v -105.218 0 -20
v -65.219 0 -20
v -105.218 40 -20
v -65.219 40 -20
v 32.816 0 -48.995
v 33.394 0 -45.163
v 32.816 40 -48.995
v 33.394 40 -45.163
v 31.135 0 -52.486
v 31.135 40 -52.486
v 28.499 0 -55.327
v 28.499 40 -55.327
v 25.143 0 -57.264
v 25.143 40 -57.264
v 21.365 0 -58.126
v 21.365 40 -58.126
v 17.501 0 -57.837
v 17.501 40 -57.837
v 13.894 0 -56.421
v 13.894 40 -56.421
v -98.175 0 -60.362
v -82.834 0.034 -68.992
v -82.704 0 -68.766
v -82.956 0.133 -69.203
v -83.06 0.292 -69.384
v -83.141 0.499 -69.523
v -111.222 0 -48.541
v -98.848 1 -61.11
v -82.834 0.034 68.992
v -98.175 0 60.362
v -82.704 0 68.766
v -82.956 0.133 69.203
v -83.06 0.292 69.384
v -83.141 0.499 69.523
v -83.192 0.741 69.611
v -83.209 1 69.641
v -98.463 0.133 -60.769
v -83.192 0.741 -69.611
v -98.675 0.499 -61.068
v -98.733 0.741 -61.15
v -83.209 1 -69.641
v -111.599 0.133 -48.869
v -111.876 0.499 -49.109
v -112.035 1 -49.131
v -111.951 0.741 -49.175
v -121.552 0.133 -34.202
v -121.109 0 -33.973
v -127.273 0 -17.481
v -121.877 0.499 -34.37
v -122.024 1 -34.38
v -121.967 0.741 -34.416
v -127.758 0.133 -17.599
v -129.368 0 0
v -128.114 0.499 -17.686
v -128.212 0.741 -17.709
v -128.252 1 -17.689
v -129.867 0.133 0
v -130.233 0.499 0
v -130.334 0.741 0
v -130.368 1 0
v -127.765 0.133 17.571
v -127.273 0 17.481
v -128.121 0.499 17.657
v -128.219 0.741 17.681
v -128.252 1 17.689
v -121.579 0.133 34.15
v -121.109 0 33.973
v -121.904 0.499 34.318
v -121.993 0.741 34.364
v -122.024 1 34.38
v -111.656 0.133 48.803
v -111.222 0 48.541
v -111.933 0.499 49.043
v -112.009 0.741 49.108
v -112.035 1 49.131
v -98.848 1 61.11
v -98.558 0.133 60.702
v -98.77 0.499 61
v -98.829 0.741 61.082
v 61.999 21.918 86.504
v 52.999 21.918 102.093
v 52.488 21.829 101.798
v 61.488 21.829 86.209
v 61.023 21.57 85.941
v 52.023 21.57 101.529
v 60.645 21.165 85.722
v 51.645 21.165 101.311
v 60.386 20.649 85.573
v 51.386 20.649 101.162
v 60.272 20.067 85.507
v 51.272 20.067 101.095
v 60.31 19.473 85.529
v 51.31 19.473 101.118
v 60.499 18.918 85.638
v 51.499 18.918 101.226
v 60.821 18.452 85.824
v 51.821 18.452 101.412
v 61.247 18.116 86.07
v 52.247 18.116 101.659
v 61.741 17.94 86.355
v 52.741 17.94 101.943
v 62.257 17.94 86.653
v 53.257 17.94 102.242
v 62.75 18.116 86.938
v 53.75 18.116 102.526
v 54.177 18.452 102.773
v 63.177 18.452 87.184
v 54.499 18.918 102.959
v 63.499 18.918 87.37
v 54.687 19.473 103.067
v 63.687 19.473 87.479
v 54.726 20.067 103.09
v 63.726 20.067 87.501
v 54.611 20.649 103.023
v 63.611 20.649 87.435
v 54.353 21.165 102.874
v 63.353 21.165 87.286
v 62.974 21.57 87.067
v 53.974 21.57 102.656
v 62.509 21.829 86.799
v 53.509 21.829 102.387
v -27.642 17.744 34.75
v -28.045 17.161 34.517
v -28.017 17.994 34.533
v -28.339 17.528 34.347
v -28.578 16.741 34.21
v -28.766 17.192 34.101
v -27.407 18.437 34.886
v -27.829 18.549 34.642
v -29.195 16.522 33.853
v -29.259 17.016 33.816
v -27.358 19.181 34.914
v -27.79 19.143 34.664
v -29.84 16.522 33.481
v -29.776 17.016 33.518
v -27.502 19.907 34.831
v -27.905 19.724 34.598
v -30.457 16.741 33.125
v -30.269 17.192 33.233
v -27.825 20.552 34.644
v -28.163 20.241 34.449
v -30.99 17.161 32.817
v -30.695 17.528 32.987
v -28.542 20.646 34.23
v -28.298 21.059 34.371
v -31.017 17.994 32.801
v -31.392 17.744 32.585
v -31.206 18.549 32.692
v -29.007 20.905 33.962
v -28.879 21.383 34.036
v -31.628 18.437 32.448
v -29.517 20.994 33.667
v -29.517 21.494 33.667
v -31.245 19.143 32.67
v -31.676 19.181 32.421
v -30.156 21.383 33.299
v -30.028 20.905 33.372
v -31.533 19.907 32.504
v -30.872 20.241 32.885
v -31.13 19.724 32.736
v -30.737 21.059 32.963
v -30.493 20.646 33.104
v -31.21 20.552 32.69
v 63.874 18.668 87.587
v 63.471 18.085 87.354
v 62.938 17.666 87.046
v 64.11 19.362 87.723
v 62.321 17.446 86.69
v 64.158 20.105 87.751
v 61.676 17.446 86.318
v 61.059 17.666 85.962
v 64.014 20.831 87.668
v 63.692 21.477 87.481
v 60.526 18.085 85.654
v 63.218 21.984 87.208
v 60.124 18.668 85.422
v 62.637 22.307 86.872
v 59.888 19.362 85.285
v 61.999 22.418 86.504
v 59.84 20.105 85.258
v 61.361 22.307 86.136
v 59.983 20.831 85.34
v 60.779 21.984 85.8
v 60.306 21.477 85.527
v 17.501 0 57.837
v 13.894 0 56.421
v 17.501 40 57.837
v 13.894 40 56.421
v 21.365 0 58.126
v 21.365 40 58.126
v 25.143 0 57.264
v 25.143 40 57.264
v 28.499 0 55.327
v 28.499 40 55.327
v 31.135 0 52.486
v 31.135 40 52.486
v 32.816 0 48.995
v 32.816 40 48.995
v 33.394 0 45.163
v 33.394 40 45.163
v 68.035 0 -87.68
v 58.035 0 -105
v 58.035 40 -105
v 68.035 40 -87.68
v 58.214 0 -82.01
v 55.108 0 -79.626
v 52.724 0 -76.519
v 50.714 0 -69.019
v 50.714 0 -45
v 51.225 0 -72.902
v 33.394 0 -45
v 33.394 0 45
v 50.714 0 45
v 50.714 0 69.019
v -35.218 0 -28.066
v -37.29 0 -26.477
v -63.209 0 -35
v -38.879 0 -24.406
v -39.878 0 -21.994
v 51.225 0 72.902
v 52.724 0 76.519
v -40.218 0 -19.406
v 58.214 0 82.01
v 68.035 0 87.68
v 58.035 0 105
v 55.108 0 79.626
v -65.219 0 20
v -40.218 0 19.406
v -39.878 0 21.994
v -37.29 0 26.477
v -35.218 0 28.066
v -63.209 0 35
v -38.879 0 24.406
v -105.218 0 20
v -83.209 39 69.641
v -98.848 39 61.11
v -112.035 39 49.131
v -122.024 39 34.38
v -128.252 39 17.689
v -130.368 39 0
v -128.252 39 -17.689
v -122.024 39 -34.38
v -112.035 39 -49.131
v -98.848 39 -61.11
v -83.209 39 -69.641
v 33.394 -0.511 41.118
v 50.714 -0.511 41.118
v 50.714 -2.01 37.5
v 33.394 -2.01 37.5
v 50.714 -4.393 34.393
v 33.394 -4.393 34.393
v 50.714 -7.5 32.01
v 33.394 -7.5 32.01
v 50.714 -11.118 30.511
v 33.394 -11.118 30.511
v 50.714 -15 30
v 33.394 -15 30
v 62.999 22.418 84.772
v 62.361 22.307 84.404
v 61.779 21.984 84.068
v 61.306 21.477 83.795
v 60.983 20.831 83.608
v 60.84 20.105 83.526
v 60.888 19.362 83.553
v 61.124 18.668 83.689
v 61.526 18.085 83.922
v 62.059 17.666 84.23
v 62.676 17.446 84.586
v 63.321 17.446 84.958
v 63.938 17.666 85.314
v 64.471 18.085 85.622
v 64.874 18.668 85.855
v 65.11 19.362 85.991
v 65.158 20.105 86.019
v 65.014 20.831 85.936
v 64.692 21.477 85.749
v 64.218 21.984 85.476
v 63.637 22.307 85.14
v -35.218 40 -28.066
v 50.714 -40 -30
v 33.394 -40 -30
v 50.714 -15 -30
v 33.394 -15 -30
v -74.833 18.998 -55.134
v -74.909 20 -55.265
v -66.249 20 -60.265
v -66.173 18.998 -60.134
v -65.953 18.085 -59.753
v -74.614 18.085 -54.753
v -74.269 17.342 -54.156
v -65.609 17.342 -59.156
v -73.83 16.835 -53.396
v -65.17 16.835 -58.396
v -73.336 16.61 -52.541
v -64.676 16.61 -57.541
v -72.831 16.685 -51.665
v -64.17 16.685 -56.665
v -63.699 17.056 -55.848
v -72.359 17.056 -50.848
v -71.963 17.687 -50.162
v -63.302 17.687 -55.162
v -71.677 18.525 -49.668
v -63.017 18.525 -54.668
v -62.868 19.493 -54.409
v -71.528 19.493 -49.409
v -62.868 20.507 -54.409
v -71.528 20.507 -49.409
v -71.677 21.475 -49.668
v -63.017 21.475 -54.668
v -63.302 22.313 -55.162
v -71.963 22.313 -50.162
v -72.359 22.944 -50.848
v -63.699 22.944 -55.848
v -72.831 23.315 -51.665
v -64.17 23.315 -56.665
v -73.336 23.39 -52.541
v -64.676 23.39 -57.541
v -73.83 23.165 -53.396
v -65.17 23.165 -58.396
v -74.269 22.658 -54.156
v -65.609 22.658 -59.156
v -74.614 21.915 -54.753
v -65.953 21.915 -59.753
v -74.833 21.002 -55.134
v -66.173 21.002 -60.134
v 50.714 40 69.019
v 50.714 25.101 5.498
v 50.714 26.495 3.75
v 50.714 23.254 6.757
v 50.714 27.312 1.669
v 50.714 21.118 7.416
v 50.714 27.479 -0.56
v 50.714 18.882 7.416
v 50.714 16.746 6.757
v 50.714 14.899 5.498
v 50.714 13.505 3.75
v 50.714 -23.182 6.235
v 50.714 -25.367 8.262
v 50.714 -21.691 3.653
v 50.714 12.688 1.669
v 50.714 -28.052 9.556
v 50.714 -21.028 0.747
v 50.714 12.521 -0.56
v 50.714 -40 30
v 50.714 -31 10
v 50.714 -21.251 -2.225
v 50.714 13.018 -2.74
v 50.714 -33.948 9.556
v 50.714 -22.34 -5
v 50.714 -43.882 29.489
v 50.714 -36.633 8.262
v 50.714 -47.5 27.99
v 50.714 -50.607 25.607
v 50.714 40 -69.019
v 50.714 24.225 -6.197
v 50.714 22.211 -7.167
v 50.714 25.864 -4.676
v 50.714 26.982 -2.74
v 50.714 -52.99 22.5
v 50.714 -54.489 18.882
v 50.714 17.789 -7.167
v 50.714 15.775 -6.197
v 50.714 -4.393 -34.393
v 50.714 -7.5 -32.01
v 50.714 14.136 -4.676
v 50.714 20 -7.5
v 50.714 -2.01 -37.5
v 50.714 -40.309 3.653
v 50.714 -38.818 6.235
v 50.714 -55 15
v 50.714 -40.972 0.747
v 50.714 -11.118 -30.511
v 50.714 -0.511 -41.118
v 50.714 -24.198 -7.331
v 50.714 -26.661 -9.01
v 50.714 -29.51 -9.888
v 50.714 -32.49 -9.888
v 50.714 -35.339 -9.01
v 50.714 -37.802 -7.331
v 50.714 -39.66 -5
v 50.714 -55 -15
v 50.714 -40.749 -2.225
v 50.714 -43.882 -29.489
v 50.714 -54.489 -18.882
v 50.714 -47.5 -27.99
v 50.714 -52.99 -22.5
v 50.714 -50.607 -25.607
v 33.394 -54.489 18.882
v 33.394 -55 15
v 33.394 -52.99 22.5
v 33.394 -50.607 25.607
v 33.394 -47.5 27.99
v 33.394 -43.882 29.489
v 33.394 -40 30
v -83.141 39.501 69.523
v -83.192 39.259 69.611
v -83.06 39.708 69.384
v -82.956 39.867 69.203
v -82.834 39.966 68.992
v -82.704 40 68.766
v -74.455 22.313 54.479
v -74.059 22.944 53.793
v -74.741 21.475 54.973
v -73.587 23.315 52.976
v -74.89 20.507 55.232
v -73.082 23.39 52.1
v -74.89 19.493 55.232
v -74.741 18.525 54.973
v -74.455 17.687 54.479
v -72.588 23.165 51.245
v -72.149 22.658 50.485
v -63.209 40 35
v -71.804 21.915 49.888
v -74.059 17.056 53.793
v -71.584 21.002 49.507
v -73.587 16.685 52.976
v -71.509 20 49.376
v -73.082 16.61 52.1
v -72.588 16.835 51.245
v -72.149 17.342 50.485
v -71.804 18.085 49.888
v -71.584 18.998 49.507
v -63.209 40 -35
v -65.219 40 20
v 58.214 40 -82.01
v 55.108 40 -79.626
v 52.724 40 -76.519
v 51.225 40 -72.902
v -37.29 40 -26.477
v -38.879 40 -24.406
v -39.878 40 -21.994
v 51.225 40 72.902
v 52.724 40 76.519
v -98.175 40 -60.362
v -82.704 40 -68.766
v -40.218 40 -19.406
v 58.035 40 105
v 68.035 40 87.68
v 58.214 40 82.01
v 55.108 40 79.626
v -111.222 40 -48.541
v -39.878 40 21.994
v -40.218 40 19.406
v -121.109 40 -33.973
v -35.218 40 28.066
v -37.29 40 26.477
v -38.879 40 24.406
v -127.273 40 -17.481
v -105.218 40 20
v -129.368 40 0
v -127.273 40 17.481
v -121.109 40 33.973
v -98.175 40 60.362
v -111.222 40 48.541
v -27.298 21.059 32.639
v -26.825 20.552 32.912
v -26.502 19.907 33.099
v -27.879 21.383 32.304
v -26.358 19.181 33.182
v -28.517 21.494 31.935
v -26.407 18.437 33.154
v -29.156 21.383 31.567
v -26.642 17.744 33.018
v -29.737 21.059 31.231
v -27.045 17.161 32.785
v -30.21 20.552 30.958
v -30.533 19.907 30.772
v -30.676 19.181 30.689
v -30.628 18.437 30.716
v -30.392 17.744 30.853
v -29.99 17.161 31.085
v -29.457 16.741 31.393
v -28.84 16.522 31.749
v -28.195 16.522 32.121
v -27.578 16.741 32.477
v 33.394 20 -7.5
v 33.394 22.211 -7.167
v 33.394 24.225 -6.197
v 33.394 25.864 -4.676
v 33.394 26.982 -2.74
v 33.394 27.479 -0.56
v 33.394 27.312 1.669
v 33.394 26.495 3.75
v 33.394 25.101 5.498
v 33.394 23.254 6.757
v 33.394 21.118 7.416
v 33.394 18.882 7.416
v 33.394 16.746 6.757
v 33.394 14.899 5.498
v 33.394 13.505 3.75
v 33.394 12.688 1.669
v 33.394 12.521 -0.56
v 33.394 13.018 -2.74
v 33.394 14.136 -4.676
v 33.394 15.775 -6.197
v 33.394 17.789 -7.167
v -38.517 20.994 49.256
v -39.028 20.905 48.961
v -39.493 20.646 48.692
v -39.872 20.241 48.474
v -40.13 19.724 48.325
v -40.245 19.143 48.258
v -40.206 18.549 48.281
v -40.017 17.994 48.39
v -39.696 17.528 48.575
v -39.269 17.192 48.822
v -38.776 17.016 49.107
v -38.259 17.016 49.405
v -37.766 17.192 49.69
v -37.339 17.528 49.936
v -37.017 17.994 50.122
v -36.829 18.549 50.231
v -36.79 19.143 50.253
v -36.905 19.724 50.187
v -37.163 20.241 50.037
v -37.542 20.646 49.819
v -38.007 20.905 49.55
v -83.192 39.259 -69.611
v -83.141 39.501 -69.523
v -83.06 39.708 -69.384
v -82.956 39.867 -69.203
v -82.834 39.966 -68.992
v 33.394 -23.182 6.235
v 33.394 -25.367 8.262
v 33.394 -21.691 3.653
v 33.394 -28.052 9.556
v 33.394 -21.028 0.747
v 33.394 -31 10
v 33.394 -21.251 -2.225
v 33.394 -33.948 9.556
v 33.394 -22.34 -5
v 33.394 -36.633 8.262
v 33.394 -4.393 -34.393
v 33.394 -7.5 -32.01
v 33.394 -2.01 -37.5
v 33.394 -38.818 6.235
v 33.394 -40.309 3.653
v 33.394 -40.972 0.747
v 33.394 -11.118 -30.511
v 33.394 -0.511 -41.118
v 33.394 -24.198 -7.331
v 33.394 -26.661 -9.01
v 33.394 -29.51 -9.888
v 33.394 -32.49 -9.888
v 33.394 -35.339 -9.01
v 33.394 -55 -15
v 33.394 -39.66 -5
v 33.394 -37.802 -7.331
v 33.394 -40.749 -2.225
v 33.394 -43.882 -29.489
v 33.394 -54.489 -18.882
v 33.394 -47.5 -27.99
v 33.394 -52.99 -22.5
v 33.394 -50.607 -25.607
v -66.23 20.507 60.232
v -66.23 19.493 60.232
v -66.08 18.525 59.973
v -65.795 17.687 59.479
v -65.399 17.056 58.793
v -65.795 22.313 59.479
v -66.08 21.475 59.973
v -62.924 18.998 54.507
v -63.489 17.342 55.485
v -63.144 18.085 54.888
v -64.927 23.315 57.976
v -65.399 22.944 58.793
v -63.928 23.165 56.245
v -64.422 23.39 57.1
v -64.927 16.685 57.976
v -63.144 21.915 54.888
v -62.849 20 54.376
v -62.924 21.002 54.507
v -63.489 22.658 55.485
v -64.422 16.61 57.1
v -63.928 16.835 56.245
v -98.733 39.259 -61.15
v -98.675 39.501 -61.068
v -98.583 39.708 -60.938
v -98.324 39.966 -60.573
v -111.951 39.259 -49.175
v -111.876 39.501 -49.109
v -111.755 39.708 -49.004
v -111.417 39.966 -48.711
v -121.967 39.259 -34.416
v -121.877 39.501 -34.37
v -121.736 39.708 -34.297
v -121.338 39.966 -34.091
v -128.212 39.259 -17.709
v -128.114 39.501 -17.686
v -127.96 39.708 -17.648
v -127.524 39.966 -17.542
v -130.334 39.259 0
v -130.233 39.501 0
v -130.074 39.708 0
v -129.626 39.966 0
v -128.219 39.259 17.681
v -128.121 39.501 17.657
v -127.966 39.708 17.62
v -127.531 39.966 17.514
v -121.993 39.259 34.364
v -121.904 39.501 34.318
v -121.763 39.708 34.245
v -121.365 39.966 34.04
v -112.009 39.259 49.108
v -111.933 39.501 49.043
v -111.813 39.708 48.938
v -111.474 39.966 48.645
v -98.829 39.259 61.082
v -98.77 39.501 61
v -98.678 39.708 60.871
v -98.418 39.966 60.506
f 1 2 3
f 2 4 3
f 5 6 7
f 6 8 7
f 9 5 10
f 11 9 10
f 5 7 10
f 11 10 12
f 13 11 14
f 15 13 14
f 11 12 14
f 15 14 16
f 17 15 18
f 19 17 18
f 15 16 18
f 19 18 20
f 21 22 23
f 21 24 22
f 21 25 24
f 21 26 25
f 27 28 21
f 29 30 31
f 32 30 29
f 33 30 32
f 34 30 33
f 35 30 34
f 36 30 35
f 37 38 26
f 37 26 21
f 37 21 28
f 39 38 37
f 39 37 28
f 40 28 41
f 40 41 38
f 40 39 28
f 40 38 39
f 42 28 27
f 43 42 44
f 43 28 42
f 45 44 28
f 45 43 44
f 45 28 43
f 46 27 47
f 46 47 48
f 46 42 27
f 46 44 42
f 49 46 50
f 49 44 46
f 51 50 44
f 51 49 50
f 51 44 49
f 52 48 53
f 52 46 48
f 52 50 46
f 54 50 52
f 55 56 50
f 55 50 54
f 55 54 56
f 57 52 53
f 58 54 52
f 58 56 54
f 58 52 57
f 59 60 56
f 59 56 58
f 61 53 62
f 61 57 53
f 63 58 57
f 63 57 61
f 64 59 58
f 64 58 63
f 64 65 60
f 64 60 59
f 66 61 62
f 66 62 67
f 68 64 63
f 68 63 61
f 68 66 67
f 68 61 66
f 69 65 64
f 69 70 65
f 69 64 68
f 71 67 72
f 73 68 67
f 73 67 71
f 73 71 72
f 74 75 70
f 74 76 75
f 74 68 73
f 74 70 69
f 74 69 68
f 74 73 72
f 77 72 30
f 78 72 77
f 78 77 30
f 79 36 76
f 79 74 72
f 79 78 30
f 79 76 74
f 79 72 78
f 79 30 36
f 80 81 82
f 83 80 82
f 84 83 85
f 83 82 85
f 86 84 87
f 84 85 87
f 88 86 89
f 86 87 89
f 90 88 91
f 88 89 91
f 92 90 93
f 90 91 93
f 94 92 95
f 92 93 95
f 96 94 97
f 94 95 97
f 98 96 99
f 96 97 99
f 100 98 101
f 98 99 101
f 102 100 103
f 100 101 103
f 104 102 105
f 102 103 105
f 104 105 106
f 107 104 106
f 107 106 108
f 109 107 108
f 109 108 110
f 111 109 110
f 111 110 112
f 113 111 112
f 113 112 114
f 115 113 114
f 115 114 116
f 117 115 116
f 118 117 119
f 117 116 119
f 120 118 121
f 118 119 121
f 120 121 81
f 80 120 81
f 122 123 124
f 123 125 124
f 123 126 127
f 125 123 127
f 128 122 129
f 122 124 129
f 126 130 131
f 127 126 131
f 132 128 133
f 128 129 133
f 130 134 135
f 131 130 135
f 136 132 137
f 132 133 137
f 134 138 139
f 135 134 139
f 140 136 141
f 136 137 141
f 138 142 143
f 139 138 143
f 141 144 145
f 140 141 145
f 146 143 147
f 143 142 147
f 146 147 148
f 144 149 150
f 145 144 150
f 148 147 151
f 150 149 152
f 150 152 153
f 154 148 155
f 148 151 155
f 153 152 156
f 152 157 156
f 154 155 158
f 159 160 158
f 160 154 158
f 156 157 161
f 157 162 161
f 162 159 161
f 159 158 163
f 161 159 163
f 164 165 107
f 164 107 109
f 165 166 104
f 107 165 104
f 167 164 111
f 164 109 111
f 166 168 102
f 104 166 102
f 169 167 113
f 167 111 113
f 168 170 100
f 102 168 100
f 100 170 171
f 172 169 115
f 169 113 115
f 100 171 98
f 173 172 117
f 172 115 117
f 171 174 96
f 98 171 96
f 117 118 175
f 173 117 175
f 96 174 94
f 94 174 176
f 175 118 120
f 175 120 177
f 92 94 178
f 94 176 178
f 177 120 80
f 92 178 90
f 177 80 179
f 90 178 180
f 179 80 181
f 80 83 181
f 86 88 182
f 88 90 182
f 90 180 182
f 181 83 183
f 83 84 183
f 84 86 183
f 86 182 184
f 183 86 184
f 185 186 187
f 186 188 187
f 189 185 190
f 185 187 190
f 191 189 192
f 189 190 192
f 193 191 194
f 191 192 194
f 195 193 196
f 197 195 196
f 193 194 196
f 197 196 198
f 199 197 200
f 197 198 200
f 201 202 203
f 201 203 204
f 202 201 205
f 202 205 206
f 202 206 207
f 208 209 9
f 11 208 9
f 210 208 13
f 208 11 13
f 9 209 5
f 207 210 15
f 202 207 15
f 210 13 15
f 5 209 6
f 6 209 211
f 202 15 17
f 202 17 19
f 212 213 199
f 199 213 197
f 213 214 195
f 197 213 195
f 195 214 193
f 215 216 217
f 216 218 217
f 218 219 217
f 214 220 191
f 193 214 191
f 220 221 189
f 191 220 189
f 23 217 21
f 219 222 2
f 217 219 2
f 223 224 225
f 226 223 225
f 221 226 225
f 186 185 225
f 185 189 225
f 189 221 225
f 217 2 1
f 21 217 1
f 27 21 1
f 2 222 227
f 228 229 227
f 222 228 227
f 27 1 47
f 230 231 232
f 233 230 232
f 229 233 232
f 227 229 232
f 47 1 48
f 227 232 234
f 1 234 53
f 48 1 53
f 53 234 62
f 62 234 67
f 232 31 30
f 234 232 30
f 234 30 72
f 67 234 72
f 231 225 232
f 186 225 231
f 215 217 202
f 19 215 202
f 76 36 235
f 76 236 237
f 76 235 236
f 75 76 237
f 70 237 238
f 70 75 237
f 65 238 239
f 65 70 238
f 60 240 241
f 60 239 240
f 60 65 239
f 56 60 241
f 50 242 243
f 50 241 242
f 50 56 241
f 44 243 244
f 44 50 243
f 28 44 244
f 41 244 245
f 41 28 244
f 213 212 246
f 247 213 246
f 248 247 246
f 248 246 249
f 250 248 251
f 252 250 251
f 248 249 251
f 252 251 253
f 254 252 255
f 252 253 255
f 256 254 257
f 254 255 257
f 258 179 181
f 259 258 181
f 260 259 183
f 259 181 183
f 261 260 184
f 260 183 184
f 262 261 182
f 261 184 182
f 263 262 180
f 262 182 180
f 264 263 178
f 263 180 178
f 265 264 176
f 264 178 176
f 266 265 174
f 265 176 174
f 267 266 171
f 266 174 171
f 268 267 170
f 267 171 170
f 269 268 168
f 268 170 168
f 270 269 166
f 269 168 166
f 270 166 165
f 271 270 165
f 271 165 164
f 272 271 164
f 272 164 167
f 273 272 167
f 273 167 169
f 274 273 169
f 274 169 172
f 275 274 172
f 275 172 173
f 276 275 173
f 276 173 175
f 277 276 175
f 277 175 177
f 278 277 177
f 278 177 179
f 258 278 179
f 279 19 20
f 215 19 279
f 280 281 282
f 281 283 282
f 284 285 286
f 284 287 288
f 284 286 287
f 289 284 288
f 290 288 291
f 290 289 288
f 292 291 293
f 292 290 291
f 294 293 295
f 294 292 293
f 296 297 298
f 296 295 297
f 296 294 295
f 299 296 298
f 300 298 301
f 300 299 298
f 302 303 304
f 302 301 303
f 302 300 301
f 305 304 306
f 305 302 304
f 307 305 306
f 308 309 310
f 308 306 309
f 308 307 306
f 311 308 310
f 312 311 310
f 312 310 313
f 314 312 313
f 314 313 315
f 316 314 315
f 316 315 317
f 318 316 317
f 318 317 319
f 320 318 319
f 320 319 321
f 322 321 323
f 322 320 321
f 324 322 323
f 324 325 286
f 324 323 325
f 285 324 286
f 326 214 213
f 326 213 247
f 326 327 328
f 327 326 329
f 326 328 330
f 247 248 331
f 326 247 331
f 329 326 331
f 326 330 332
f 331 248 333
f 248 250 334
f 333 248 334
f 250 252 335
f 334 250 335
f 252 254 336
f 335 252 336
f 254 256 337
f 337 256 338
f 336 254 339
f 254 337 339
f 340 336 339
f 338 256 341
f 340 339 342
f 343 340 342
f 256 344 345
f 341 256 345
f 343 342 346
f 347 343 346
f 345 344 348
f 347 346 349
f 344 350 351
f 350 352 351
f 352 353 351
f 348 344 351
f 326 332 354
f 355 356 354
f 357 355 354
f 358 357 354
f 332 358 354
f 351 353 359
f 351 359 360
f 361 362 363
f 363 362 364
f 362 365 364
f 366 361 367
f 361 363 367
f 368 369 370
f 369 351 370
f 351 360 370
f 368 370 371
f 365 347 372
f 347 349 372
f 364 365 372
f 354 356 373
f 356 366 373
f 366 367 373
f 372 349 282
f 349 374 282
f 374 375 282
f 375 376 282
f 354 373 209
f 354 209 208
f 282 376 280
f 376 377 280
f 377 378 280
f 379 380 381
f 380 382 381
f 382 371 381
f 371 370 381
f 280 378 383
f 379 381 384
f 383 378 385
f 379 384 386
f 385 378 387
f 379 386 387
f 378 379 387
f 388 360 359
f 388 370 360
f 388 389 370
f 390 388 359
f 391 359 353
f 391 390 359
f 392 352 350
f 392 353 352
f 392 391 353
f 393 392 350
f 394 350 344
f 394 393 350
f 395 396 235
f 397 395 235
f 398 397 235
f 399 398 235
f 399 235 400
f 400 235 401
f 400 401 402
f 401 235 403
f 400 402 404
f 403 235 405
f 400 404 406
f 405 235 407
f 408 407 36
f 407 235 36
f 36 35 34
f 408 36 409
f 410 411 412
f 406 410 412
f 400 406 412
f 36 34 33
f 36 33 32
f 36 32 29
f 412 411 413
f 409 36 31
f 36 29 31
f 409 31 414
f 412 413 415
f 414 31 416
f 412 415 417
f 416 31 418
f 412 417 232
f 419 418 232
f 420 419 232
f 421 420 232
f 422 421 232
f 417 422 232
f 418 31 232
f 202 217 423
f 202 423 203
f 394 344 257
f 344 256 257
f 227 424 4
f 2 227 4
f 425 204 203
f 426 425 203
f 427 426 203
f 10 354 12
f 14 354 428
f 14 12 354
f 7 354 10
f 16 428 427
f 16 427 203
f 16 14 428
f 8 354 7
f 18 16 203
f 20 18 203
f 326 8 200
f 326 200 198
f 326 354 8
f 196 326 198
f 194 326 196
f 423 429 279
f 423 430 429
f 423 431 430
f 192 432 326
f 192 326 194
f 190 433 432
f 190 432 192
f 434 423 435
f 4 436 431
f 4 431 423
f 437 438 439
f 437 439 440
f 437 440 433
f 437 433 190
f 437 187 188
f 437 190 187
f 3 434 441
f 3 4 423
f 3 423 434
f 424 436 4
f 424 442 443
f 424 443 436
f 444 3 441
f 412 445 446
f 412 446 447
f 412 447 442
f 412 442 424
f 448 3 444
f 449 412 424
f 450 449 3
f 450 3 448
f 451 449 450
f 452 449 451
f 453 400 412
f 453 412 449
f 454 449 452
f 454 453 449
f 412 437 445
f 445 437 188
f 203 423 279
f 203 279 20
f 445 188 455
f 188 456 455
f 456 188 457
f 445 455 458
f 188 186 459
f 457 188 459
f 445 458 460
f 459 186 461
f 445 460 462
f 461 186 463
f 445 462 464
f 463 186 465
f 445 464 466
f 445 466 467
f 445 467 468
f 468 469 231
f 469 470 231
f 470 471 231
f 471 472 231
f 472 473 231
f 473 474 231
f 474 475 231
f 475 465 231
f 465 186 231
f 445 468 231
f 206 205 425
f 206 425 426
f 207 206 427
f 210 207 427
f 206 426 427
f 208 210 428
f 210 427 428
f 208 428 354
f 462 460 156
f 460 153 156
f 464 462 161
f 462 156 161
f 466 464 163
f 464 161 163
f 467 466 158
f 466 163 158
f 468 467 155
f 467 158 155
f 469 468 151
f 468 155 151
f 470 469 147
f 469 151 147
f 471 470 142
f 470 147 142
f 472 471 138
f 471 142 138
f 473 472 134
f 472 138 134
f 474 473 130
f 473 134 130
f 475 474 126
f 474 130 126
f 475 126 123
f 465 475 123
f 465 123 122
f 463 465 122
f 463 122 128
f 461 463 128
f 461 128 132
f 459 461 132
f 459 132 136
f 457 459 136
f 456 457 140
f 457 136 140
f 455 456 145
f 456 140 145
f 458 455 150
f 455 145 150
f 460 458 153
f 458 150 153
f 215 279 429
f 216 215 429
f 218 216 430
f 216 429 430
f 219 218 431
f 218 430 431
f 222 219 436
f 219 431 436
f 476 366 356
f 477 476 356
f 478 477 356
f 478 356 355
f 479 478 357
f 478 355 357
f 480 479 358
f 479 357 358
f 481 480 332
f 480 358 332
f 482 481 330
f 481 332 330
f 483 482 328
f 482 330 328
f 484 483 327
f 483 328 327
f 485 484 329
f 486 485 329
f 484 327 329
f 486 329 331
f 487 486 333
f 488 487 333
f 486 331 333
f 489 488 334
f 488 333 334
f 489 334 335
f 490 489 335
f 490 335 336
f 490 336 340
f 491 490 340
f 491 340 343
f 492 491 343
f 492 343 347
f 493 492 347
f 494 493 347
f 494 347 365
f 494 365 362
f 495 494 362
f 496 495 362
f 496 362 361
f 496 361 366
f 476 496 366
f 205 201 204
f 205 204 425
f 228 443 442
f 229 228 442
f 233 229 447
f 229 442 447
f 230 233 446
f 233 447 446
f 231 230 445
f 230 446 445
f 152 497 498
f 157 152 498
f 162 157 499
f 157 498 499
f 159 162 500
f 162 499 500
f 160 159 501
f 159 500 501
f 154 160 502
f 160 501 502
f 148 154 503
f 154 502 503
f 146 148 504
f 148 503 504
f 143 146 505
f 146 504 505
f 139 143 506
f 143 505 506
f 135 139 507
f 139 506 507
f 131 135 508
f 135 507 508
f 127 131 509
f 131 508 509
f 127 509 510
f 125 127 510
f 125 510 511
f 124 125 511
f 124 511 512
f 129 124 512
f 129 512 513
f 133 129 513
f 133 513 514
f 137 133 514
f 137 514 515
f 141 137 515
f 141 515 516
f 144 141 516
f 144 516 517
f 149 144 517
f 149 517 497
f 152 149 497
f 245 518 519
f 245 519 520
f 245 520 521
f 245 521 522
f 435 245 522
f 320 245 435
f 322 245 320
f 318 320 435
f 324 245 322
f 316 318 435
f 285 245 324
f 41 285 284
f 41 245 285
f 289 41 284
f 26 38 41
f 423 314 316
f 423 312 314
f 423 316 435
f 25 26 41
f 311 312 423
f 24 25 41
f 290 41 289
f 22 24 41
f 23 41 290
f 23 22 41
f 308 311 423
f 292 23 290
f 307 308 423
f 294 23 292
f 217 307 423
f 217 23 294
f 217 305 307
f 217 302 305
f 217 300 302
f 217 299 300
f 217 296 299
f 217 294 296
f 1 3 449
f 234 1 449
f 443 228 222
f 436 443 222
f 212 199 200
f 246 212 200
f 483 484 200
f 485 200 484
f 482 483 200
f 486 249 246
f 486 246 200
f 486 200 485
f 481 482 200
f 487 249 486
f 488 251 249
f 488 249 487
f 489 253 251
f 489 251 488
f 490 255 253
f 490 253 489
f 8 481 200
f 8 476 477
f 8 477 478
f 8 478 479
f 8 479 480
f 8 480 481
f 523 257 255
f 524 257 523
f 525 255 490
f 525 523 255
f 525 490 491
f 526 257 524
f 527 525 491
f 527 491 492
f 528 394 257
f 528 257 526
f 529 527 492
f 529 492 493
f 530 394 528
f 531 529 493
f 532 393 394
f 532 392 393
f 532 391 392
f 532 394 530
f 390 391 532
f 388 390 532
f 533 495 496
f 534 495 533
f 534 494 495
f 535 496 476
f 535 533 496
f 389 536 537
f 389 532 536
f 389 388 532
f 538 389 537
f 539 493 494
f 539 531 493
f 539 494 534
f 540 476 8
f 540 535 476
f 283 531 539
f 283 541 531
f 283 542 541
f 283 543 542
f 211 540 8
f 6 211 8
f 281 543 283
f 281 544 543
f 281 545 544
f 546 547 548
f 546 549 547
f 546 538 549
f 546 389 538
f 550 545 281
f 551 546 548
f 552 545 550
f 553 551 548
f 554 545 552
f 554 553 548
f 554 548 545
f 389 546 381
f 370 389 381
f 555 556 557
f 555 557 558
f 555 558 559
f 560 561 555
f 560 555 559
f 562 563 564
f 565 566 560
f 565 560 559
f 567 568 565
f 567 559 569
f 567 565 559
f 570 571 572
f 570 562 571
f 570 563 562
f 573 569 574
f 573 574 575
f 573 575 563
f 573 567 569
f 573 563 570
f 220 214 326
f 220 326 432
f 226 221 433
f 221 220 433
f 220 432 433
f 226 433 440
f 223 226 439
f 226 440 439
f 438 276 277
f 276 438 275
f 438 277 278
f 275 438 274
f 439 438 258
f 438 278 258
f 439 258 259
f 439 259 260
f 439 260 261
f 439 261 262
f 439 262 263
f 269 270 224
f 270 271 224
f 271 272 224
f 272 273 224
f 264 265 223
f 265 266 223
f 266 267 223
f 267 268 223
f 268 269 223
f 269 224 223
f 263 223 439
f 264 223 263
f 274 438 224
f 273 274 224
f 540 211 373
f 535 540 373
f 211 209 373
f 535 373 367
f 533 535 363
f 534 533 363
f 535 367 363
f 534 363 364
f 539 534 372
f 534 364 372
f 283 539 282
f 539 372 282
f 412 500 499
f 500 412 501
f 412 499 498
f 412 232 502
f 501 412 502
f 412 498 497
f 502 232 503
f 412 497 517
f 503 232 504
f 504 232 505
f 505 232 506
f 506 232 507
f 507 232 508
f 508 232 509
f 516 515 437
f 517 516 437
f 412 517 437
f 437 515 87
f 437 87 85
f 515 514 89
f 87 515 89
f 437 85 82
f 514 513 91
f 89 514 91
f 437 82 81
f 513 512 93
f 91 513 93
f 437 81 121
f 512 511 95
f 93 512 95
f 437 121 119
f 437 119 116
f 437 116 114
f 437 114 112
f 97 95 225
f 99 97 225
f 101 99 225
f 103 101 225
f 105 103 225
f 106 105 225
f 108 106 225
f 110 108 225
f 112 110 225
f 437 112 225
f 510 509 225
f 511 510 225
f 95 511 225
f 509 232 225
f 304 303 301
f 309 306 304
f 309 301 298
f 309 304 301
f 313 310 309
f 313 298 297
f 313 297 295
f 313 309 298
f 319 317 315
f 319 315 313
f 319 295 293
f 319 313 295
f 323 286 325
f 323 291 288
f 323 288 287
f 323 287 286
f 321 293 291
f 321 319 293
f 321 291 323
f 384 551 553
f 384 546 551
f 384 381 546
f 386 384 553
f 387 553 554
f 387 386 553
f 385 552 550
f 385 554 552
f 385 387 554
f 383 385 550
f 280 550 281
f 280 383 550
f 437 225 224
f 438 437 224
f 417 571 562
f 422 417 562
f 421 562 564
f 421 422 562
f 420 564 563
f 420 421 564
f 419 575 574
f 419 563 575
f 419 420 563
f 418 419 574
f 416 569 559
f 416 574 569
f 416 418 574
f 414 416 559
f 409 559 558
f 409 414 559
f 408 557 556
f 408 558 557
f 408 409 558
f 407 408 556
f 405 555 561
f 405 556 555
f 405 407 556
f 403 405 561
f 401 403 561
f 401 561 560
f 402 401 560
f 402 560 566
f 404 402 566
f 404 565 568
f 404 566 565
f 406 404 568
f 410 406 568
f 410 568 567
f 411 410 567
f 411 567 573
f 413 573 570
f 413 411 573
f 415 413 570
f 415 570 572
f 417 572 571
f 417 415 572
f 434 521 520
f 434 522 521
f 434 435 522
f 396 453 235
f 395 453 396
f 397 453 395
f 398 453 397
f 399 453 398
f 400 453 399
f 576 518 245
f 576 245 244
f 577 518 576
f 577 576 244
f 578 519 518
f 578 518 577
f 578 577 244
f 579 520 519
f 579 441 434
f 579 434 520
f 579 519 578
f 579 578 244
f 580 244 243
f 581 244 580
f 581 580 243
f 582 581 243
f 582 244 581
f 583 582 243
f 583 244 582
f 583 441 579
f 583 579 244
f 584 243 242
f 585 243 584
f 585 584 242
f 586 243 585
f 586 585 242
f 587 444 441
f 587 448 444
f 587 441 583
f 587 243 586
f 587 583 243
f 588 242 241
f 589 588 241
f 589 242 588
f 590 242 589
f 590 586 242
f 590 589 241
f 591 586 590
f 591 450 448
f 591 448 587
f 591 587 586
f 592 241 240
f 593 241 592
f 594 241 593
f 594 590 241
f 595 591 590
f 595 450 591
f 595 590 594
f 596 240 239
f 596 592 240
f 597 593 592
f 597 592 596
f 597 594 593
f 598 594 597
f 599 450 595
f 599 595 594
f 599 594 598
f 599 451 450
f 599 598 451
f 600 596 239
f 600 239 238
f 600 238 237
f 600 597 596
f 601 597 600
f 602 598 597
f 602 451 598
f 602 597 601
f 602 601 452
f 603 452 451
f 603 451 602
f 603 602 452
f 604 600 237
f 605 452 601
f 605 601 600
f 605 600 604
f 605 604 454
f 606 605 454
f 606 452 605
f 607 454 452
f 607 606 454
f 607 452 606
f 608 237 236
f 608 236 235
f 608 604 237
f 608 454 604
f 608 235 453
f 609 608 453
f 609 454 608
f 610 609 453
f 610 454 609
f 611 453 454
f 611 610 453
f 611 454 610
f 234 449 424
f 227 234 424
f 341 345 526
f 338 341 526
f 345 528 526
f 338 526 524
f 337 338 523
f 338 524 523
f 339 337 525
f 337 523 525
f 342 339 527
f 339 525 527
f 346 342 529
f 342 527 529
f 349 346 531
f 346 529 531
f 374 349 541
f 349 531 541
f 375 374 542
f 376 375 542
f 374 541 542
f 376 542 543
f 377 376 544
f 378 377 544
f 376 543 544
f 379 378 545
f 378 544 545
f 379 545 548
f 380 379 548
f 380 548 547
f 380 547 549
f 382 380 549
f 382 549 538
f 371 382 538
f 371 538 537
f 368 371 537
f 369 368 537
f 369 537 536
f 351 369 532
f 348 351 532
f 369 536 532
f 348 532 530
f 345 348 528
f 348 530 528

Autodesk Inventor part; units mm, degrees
ref_plane "YZ Plane" through (0, 0, 0) normal (1, 0, 0) x (0, 1, 0)
ref_plane "XZ Plane" through (0, 0, 0) normal (0, 1, 0) x (-1, 0, 0)
ref_plane "XY Plane" through (0, 0, 0) normal (0, 0, 1) x (1, 0, 0)
sketch "Sketch1" plane through (0, 0, 0) normal (0, 1, 0) x (-1, 0, 0)
  line L0 (-126.3701, 48.161) -> (-51.2671, 4.8003) construction
  line L1 (-51.2671, 4.8003) -> (-126.3701, -38.5605) construction
  line L2 (-126.3701, -38.5605) -> (-126.3701, 48.161) construction
  line L3 (110.9585, 0) -> (-59.5814, 0) construction
  line L4 (83.2089, 69.641) -> (63.2089, 35)
  line L5 (63.2089, 35) -> (-58.0347, 105)
  line L6 (-58.0347, 105) -> (-68.0347, 87.6795)
  line L7 (-68.0347, 87.6795) -> (-50.7142, 77.6795)
  line L8 (-33.3937, 67.6795) -> (40.2185, 25.1795)
  line L9 (83.2089, -69.641) -> (63.2089, -35)
  line L10 (63.2089, -35) -> (-58.0347, -105)
  line L11 (-58.0347, -105) -> (-68.0347, -87.6795)
  line L12 (-68.0347, -87.6795) -> (-50.7142, -77.6795)
  line L13 (-33.3937, -67.6795) -> (40.2185, -25.1795)
  arc A0 (83.2089, -69.641) -> (83.2089, 69.641) centre (55.3678, 0) ccw
  line L14 (-50.7142, 77.6795) -> (-50.7142, -77.6795)
  line L15 (-33.3937, 67.6795) -> (-33.3937, -67.6795)
  line L16 (40.2185, 25.1795) -> (40.2185, -25.1795)
  dimension "d3" = 40
  dimension "d4" = 140
  dimension "d5" = 20
  dimension "d7" = 20
  dimension "d19" = 70
  dimension "d20" = 75
  dimension "d21" = 20
  dimension "d22" = 85
extrude "Extrusion1" add sketch "Sketch1" along normal blind 40
sketch "Sketch2" plane through (-63.2089, 0, 35) normal (0.866, 0, 0.5) x (0.5, 0, -0.866)
  circle A0 centre (-20, 20) radius 3.4
  line L0 (-40, 40) -> (0, 40) projected
  line L1 (-40, 0) -> (-40, 40) projected
  point P0 (61.9153, 0)
  point P1 (-20, 40)
  point P2 (-40, 20)
  dimension "d10" = 6.8
extrude "Extrusion2" add sketch "Sketch2" along normal blind 10
sketch "Sketch3" plane through (-83.2089, 0, -69.641) normal (0.866, 0, -0.5) x (-0.5, 0, -0.866)
  circle A0 centre (-20, 20) radius 3.4
  line L0 (-40, 40) -> (0, 40) projected
  line L1 (0, 0) -> (0, 40) projected
  point P0 (-101.9153, 0)
  point P1 (-20, 40)
  point P2 (0, 20)
  dimension "d13" = 6.8
extrude "Extrusion3" add sketch "Sketch3" along normal blind 10
sketch "Sketch4" plane through (0, 40, 0) normal (0, 1, 0) x (1, 0, 0)
  line L0 (-105.2185, -20) -> (-65.2185, -20)
  line L1 (-65.2185, -20) -> (-65.2185, 20)
  line L2 (-65.2185, 20) -> (-105.2185, 20)
  line L3 (-105.2185, 20) -> (-105.2185, -20)
  line L4 (-40.2185, -25.1795) -> (-40.2185, 25.1795) projected
  point P0 (0, 0)
  point P1 (-105.2185, 0)
  dimension "d16" = 40
  dimension "d17" = 40
  dimension "d23" = 25
extrude "Extrusion4" cut sketch "Sketch4" against normal blind 40
fillet "Fillet1" radius 10 2 edges at (-40.2185, 20, -25.1795) (-40.2185, 20, 25.1795)
fillet "Fillet2" radius 13 2 edges at (33.3937, 20, 67.6795) (33.3937, 20, -67.6795)
fillet "Fillet3" radius 15 2 edges at (50.7142, 20, 77.6795) (50.7142, 20, -77.6795)
sketch "Sketch5" plane through (68.0347, 0, 87.6795) normal (0.5, 0, -0.866) x (-0.866, 0, -0.5)
  point P0 (102.7595, 0)
  point P1 (5.815, 19.918)
hole "Hole1" at (62.9988, 19.918, 84.772) direction (-0.5, 0, 0.866) diameter 4 end through all counterbore diameter 5 counterbore depth 2
sketch "Sketch6" plane through (-35.2185, 0, 28.0662) normal (0.5, 0, -0.866) x (-0.866, 0, -0.5)
  point P0 (-16.467, 0)
  point P1 (-7.7378, 18.9937)
hole "Hole2" at (-28.5174, 18.9937, 31.9351) direction (-0.5, 0, 0.866) diameter 4 end through all counterbore diameter 5 counterbore depth 2
fillet "Fillet9" radius 1 2 edges at (-130.3678, 0, 0) (-130.3678, 40, 0)
sketch "Sketch11" plane through (0, 0, 0) normal (0, -1, 0) x (1, 0, 0)
  line L0 (33.3937, -30) -> (50.7142, -30)
  line L1 (50.7142, -30) -> (50.7142, 30)
  line L2 (50.7142, 30) -> (33.3937, 30)
  line L3 (33.3937, 30) -> (33.3937, -30)
  line L4 (33.3937, 45.1628) -> (33.3937, -45.1628) projected
  line L5 (50.7142, 69.0192) -> (50.7142, -69.0192) projected
  point P0 (0, 0)
  point P1 (33.3937, 0)
  dimension "d89" = 60
extrude "Extrusion8" add sketch "Sketch11" along normal blind 55
sketch "Sketch12" plane through (33.3937, 0, -45.1628) normal (-1, 0, 0) x (0, 0, 1)
  circle A0 centre (45.1628, -31) radius 10
  point P0 (45.1628, 0)
  dimension "d92" = 20
  dimension "d93" = 31
extrude "Extrusion9" cut sketch "Sketch12" against normal up to next
fillet "Fillet10" radius 15 4 edges at (42.0539, 0, 30) (42.0539, -55, 30) (42.0539, 0, -30) (42.0539, -55, -30)
sketch "Sketch13" plane through (50.7142, 0, -69.0192) normal (1, 0, 0) x (0, 0, -1)
  circle A0 centre (-69.0192, 20) radius 7.5
  line L0 (-49.6132, 0) -> (-88.4252, 0) projected
  point P0 (-69.0192, 0)
  dimension "d97" = 15
  dimension "d98" = 20
extrude "Extrusion10" cut sketch "Sketch13" against normal up to next
properties part number "Profil_Winkel_oben"
